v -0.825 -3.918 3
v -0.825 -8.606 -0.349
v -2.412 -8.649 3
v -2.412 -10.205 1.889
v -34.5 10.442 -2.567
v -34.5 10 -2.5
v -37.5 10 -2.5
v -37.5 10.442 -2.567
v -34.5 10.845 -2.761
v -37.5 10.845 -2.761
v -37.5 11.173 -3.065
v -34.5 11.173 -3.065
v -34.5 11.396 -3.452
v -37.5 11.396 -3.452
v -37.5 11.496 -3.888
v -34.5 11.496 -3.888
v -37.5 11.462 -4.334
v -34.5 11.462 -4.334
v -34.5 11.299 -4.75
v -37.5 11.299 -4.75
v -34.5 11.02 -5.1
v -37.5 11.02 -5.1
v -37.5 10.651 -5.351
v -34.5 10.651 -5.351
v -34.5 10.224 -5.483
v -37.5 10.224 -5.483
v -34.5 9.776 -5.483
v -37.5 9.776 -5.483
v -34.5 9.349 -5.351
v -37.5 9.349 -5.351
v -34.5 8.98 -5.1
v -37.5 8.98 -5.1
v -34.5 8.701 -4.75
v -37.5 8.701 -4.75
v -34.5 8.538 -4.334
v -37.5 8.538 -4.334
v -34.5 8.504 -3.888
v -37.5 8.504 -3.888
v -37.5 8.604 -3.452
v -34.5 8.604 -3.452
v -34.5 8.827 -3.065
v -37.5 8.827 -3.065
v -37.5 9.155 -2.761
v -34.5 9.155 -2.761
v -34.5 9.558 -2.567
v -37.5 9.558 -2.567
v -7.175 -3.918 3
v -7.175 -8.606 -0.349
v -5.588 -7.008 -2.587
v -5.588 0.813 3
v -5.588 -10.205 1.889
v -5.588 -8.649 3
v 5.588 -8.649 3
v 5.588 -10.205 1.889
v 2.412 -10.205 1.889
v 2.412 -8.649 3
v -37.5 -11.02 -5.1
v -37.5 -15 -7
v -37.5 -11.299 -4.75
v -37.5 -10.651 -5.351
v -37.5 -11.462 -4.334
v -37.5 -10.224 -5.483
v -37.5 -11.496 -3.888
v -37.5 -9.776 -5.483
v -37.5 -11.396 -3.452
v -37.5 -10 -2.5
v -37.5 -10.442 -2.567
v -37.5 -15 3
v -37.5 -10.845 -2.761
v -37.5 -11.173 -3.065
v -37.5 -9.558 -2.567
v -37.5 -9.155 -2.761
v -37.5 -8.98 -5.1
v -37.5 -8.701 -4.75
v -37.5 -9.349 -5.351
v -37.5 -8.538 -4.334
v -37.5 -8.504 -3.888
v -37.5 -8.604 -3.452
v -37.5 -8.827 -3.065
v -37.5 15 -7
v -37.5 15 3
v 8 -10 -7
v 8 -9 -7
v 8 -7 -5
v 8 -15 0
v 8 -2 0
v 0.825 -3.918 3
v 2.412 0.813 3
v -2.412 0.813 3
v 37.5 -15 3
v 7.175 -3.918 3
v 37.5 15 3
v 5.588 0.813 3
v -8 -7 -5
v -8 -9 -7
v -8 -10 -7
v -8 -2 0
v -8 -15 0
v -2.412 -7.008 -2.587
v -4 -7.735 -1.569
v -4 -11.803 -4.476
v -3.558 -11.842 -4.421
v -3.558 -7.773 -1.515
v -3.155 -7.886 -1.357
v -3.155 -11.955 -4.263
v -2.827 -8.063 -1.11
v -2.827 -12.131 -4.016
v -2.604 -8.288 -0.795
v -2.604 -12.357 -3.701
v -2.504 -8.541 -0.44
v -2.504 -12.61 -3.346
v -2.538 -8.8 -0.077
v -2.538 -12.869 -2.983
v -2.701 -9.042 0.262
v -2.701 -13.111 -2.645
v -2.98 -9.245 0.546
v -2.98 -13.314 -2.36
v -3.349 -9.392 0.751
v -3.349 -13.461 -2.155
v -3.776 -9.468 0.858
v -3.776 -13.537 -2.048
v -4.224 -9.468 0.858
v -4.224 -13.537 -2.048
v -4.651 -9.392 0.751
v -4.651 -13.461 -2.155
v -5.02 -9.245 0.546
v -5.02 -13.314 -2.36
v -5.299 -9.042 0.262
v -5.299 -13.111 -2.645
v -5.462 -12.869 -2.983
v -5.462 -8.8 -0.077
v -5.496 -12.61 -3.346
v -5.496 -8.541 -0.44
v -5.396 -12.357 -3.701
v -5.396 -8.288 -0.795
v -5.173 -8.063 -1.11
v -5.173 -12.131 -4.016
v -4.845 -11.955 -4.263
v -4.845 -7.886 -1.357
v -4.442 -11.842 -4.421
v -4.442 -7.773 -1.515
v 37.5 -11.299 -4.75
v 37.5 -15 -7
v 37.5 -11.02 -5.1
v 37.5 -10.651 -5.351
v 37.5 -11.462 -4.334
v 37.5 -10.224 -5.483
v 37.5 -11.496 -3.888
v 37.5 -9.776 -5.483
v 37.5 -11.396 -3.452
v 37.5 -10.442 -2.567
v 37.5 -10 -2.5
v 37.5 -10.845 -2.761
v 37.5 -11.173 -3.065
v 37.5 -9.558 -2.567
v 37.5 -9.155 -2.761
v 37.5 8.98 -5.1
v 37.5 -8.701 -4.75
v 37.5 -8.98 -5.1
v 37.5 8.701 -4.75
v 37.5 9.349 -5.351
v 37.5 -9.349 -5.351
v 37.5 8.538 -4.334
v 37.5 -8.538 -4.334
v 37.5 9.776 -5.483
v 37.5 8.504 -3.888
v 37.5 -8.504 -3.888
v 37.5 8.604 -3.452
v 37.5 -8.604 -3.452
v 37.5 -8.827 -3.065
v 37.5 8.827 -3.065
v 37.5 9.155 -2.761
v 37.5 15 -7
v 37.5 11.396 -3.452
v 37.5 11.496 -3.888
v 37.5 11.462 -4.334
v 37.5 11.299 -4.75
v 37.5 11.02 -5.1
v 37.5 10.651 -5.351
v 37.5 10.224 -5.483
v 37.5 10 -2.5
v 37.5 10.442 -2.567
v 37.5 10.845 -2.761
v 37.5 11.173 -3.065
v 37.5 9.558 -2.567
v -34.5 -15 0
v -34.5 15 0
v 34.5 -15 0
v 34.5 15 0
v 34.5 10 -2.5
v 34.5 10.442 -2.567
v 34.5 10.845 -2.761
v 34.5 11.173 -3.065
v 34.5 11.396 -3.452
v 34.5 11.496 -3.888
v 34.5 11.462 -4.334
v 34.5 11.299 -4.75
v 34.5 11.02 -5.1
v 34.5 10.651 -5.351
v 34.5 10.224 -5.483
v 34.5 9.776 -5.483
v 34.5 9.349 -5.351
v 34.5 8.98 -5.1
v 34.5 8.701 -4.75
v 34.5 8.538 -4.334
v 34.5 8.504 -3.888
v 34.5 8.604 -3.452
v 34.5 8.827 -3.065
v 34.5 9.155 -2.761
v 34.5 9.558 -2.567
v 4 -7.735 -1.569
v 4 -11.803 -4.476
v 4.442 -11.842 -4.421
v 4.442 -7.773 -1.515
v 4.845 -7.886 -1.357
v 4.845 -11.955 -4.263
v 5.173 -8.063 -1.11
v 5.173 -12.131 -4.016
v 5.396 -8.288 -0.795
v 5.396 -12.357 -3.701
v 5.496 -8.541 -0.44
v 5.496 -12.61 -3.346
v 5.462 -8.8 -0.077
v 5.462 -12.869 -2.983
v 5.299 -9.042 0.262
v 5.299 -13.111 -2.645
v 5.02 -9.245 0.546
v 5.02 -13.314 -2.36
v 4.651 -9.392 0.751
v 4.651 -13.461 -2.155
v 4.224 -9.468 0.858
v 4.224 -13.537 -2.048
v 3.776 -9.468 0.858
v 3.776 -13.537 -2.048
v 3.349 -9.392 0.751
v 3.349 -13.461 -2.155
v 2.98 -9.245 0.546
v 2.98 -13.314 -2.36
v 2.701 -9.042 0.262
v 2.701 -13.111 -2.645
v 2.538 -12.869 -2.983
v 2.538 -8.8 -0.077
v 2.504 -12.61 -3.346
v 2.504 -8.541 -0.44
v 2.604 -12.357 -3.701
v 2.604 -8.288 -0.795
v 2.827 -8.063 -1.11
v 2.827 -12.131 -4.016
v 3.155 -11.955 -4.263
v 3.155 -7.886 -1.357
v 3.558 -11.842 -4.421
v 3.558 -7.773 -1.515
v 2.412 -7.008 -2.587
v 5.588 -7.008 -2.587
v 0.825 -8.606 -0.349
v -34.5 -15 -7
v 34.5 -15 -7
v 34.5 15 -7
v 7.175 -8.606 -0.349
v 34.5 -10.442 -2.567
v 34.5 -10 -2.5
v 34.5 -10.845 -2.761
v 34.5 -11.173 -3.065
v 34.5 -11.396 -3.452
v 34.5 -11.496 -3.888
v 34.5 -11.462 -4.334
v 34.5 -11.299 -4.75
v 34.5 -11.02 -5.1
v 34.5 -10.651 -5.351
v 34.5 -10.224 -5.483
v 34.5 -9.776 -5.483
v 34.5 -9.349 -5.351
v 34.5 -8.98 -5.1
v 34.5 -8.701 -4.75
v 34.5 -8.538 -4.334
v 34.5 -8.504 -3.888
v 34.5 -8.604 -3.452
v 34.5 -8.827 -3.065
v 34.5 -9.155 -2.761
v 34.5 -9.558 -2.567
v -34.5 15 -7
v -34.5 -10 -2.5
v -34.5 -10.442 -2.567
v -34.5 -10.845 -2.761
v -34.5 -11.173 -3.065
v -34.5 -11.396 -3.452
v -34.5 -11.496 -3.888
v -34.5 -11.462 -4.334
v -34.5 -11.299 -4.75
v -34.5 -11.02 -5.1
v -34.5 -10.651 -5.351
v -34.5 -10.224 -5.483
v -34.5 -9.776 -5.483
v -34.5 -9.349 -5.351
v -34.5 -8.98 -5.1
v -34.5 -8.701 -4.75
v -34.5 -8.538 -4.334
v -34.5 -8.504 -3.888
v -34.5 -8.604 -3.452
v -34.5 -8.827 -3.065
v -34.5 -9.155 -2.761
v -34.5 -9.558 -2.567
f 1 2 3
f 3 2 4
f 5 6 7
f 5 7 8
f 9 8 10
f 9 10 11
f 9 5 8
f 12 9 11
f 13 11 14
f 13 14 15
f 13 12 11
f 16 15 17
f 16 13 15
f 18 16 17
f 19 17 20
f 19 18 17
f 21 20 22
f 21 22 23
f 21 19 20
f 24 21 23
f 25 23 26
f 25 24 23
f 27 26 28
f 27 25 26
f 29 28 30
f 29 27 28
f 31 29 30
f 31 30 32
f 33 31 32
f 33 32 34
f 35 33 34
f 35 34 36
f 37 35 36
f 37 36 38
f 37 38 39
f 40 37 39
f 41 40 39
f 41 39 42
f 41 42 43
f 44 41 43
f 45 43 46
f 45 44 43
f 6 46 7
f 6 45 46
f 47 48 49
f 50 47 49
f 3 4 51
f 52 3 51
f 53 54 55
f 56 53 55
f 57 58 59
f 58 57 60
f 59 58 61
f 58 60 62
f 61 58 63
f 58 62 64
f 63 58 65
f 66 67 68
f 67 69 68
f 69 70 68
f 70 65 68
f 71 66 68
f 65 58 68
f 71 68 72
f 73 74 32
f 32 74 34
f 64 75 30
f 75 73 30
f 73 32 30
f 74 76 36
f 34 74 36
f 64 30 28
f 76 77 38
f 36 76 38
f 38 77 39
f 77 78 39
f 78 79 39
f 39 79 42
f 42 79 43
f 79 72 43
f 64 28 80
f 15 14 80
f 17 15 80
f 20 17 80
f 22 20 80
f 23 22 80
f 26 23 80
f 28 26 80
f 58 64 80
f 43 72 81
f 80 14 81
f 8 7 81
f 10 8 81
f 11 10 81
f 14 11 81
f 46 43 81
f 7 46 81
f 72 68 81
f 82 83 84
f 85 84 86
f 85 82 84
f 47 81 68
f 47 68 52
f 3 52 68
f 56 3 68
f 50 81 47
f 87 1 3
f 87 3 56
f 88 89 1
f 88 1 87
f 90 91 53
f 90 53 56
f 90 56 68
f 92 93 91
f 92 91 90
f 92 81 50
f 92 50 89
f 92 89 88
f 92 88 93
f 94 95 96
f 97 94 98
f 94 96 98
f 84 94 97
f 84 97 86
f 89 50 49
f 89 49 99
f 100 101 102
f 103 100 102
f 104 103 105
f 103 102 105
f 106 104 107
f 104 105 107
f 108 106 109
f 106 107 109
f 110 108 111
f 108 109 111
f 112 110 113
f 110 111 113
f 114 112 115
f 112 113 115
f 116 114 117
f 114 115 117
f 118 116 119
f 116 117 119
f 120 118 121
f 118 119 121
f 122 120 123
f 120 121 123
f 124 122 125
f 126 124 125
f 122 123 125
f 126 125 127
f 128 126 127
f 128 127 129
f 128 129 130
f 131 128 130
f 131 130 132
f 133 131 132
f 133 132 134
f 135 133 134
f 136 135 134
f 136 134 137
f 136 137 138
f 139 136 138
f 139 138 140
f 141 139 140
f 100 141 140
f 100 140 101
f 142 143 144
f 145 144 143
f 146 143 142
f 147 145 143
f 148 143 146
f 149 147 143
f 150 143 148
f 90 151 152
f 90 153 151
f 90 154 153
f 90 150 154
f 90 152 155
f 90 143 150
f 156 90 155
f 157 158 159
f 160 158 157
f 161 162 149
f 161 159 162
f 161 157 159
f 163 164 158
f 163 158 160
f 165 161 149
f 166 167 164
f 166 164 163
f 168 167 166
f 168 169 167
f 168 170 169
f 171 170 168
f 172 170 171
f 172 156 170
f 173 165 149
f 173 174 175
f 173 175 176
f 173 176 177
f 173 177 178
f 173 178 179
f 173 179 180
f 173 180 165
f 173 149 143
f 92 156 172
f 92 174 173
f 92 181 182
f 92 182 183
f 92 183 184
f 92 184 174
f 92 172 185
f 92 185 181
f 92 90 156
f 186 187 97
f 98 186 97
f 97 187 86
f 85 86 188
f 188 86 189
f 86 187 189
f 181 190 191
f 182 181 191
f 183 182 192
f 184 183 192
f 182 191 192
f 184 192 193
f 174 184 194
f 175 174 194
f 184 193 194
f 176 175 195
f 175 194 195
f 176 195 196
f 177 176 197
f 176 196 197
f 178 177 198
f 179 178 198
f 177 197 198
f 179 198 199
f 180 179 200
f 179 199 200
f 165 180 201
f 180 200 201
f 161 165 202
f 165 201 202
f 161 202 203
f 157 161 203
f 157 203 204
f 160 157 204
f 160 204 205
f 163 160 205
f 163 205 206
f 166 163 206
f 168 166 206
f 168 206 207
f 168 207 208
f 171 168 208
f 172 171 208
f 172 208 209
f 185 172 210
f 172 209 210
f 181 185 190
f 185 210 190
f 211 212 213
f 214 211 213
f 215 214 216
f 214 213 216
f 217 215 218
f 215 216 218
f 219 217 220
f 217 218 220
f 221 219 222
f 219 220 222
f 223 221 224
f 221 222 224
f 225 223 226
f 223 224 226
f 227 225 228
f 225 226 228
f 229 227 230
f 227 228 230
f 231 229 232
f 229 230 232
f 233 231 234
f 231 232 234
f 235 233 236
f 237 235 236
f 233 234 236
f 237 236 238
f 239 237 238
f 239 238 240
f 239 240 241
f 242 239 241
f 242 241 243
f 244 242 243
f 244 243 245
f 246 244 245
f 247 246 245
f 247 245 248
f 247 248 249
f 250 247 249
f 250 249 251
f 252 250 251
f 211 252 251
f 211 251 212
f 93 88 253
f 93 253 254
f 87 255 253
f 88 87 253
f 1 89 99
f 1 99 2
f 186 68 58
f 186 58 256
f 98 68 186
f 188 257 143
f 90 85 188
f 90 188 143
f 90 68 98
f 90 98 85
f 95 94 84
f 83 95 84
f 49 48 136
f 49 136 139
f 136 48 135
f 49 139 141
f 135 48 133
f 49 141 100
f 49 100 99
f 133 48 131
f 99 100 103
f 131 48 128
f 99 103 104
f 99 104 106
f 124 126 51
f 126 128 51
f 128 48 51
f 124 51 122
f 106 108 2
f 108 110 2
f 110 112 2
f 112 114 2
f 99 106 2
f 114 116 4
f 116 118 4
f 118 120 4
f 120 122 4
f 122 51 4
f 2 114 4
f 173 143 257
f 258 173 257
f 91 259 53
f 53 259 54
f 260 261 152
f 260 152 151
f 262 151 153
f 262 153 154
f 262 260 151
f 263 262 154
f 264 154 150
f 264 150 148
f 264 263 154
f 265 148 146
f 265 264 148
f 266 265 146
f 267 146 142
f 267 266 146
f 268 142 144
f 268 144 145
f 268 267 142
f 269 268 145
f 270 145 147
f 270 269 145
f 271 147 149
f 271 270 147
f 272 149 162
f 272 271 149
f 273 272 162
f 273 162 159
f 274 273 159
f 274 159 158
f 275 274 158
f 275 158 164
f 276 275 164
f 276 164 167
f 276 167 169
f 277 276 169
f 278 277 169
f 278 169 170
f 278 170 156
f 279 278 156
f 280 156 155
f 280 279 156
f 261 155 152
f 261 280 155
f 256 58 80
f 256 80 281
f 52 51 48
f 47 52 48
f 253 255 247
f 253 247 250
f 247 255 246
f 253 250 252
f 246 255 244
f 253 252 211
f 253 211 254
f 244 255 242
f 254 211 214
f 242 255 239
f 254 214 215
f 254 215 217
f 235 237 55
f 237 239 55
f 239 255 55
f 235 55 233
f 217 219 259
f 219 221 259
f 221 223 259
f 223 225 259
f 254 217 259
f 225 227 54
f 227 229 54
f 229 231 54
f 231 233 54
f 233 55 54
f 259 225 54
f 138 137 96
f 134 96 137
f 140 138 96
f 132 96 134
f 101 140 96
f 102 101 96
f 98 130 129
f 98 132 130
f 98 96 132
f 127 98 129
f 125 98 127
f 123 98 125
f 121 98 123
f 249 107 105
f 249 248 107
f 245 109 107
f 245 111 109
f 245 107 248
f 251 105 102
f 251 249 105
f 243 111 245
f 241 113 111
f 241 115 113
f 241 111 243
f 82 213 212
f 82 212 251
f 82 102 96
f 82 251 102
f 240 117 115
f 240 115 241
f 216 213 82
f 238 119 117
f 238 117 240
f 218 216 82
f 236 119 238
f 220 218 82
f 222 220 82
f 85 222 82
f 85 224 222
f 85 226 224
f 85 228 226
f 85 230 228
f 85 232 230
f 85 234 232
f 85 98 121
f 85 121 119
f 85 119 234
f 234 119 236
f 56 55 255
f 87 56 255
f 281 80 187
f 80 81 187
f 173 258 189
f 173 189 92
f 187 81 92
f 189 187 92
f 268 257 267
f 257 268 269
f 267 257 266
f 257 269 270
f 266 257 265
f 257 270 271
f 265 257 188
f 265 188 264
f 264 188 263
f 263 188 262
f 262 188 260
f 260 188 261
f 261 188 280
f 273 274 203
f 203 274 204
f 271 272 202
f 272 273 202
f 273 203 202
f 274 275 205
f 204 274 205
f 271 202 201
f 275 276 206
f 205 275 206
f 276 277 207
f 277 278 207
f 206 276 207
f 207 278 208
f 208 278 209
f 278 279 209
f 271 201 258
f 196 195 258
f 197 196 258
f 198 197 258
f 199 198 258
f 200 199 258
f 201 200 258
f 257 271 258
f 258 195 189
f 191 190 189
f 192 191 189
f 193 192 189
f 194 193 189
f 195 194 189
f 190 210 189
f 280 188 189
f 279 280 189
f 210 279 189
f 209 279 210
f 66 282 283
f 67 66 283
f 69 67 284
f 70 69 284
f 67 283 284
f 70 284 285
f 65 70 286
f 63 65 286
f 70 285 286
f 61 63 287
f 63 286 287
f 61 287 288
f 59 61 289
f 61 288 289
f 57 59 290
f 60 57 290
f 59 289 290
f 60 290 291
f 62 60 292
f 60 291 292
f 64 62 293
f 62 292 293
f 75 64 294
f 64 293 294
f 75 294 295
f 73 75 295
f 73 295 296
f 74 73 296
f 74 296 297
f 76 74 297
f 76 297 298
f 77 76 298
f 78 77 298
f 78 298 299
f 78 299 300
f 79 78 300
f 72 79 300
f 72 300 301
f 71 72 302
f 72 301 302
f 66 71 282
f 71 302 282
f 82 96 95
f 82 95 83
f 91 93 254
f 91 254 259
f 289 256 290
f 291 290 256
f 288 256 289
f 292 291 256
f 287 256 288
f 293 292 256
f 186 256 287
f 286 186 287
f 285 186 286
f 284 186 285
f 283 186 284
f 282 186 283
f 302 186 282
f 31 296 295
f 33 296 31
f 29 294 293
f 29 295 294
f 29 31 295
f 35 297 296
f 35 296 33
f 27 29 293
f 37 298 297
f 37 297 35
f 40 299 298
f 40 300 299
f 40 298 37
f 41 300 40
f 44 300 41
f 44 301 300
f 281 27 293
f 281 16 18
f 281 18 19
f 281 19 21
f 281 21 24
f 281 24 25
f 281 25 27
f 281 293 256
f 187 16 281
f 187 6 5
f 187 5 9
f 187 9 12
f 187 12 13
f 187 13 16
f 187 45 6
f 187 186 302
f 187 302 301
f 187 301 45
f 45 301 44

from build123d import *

# Parameters (mm, degrees)
SKETCH1_W               = 75
SKETCH1_H               = 30
BOSS_EXTRUDE1_DEPTH     = 3
SKETCH2_W               = 3
SKETCH2_H               = 30
BOSS_EXTRUDE2_DEPTH     = 7
SKETCH4_R               = 1.5
CUT_EXTRUDE1_DEPTH      = 3
MIRROR1_COPY_1_SKETCH_R = 1.5
MIRROR1_COPY_1_DEPTH    = 3
SKETCH5_W               = 16
SKETCH5_H               = 7
BOSS_EXTRUDE3_DEPTH     = 8
CHAMFER1_SIZE           = 5
CHAMFER1_SIZE2          = 7
CHAMFER2_SIZE           = 5
CHAMFER3_SIZE           = 2
SKETCH6_R               = 1.5
CUT_EXTRUDE2_DEPTH      = 8
CUT_EXTRUDE3_START      = -5
CUT_EXTRUDE3_DEPTH      = 42.149507332


with BuildPart() as part:
    # Sketch1 → Boss-Extrude1 (new body)
    with BuildSketch(Plane.XY):
        Rectangle(SKETCH1_W, SKETCH1_H)
    extrude(amount=BOSS_EXTRUDE1_DEPTH)

    # Sketch2 → Boss-Extrude2 (add)
    with BuildSketch(Plane(origin=(0, 0, 0), x_dir=(-1, 0, 0), z_dir=(0, 0, -1))):
        with Locations((-36, 0)):
            Rectangle(SKETCH2_W, SKETCH2_H)
    boss_extrude2 = extrude(amount=BOSS_EXTRUDE2_DEPTH)

    # Sketch4 → Cut-Extrude1 (cut)
    with BuildSketch(Plane.ZY.offset(-34.5)):
        with Locations((-4, 10)):
            Circle(SKETCH4_R)
    cut_extrude1 = extrude(amount=-CUT_EXTRUDE1_DEPTH, mode=Mode.SUBTRACT)

    # Mirror2: Cut-Extrude1 across plane
    add(cut_extrude1.mirror(Plane.ZX), mode=Mode.SUBTRACT)

    # Mirror1: Boss-Extrude2, Cut-Extrude1 across plane
    add(boss_extrude2.mirror(Plane(origin=(0, 0, 0), x_dir=(0, 0, 1), z_dir=(1, 0, 0))))
    add(cut_extrude1.mirror(Plane(origin=(0, 0, 0), x_dir=(0, 0, 1), z_dir=(1, 0, 0))), mode=Mode.SUBTRACT)

    # Mirror1 copy 1 sketch → Mirror1 copy 1 (cut)
    with BuildSketch(Plane(origin=(-34.5, 0, 0), x_dir=(0, 0, 1), z_dir=(1, 0, 0))):
        with Locations((-4, 10)):
            Circle(MIRROR1_COPY_1_SKETCH_R)
    extrude(amount=-MIRROR1_COPY_1_DEPTH, mode=Mode.SUBTRACT)

    # Sketch5 → Boss-Extrude3 (add)
    with BuildSketch(Plane.XZ.offset(15)):
        with Locations((0, -3.5)):
            Rectangle(SKETCH5_W, SKETCH5_H)
    extrude(amount=-BOSS_EXTRUDE3_DEPTH)

    # Chamfer1
    chamfer1_edges = [part.edges().sort_by_distance(p)[0] for p in [
        (0, -15, -7),
    ]]
    chamfer1_side = [part.faces().sort_by_distance(p)[0] for p in [
        (0, -11, -7),
    ]]
    chamfer(chamfer1_edges, length=CHAMFER1_SIZE, length2=CHAMFER1_SIZE2, reference=chamfer1_side[0])

    # Chamfer2
    chamfer2_edges = [part.edges().sort_by_distance(p)[0] for p in [
        (0, -7, 0),
    ]]
    chamfer(chamfer2_edges, length=CHAMFER2_SIZE)

    # Chamfer3
    chamfer3_edges = [part.edges().sort_by_distance(p)[0] for p in [
        (0, -7, -7),
    ]]
    chamfer(chamfer3_edges, length=CHAMFER3_SIZE - 0.0001)  # a hair under: the kernel refuses the full size

    # Sketch6 → Cut-Extrude2 (cut)
    with BuildSketch(Plane(origin=(0, -9.932432432, -7.094594595), x_dir=(1, 0, 0), z_dir=(0, -0.8137334712067358, -0.5812381937190955))):
        with Locations(Location((-4, 4.718572906, 0), (0, 0, 270))):
            Circle(SKETCH6_R)
        with Locations(Location((4, 4.718572906, 0), (0, 0, 270))):
            Circle(SKETCH6_R)
    extrude(amount=-CUT_EXTRUDE2_DEPTH, mode=Mode.SUBTRACT)

    # Sketch7 → Cut-Extrude3 (cut, through all)
    with BuildSketch(Plane(origin=(0, -9.932432432, -7.094594595), x_dir=(1, 0, 0), z_dir=(0, -0.8137334712067358, -0.5812381937190955)).offset(CUT_EXTRUDE3_START)):
        Polygon((-0.824573519, 4.718572906), (-2.41228676, 7.468572906), (-5.58771324, 7.468572906), (-7.175426481, 4.718572906), (-5.58771324, 1.968572906), (-2.41228676, 1.968572906), align=None)
        Polygon((7.175426481, 4.718572906), (5.58771324, 7.468572906), (2.41228676, 7.468572906), (0.824573519, 4.718572906), (2.41228676, 1.968572906), (5.58771324, 1.968572906), align=None)
    extrude(amount=-CUT_EXTRUDE3_DEPTH, mode=Mode.SUBTRACT)


solid = part.part
